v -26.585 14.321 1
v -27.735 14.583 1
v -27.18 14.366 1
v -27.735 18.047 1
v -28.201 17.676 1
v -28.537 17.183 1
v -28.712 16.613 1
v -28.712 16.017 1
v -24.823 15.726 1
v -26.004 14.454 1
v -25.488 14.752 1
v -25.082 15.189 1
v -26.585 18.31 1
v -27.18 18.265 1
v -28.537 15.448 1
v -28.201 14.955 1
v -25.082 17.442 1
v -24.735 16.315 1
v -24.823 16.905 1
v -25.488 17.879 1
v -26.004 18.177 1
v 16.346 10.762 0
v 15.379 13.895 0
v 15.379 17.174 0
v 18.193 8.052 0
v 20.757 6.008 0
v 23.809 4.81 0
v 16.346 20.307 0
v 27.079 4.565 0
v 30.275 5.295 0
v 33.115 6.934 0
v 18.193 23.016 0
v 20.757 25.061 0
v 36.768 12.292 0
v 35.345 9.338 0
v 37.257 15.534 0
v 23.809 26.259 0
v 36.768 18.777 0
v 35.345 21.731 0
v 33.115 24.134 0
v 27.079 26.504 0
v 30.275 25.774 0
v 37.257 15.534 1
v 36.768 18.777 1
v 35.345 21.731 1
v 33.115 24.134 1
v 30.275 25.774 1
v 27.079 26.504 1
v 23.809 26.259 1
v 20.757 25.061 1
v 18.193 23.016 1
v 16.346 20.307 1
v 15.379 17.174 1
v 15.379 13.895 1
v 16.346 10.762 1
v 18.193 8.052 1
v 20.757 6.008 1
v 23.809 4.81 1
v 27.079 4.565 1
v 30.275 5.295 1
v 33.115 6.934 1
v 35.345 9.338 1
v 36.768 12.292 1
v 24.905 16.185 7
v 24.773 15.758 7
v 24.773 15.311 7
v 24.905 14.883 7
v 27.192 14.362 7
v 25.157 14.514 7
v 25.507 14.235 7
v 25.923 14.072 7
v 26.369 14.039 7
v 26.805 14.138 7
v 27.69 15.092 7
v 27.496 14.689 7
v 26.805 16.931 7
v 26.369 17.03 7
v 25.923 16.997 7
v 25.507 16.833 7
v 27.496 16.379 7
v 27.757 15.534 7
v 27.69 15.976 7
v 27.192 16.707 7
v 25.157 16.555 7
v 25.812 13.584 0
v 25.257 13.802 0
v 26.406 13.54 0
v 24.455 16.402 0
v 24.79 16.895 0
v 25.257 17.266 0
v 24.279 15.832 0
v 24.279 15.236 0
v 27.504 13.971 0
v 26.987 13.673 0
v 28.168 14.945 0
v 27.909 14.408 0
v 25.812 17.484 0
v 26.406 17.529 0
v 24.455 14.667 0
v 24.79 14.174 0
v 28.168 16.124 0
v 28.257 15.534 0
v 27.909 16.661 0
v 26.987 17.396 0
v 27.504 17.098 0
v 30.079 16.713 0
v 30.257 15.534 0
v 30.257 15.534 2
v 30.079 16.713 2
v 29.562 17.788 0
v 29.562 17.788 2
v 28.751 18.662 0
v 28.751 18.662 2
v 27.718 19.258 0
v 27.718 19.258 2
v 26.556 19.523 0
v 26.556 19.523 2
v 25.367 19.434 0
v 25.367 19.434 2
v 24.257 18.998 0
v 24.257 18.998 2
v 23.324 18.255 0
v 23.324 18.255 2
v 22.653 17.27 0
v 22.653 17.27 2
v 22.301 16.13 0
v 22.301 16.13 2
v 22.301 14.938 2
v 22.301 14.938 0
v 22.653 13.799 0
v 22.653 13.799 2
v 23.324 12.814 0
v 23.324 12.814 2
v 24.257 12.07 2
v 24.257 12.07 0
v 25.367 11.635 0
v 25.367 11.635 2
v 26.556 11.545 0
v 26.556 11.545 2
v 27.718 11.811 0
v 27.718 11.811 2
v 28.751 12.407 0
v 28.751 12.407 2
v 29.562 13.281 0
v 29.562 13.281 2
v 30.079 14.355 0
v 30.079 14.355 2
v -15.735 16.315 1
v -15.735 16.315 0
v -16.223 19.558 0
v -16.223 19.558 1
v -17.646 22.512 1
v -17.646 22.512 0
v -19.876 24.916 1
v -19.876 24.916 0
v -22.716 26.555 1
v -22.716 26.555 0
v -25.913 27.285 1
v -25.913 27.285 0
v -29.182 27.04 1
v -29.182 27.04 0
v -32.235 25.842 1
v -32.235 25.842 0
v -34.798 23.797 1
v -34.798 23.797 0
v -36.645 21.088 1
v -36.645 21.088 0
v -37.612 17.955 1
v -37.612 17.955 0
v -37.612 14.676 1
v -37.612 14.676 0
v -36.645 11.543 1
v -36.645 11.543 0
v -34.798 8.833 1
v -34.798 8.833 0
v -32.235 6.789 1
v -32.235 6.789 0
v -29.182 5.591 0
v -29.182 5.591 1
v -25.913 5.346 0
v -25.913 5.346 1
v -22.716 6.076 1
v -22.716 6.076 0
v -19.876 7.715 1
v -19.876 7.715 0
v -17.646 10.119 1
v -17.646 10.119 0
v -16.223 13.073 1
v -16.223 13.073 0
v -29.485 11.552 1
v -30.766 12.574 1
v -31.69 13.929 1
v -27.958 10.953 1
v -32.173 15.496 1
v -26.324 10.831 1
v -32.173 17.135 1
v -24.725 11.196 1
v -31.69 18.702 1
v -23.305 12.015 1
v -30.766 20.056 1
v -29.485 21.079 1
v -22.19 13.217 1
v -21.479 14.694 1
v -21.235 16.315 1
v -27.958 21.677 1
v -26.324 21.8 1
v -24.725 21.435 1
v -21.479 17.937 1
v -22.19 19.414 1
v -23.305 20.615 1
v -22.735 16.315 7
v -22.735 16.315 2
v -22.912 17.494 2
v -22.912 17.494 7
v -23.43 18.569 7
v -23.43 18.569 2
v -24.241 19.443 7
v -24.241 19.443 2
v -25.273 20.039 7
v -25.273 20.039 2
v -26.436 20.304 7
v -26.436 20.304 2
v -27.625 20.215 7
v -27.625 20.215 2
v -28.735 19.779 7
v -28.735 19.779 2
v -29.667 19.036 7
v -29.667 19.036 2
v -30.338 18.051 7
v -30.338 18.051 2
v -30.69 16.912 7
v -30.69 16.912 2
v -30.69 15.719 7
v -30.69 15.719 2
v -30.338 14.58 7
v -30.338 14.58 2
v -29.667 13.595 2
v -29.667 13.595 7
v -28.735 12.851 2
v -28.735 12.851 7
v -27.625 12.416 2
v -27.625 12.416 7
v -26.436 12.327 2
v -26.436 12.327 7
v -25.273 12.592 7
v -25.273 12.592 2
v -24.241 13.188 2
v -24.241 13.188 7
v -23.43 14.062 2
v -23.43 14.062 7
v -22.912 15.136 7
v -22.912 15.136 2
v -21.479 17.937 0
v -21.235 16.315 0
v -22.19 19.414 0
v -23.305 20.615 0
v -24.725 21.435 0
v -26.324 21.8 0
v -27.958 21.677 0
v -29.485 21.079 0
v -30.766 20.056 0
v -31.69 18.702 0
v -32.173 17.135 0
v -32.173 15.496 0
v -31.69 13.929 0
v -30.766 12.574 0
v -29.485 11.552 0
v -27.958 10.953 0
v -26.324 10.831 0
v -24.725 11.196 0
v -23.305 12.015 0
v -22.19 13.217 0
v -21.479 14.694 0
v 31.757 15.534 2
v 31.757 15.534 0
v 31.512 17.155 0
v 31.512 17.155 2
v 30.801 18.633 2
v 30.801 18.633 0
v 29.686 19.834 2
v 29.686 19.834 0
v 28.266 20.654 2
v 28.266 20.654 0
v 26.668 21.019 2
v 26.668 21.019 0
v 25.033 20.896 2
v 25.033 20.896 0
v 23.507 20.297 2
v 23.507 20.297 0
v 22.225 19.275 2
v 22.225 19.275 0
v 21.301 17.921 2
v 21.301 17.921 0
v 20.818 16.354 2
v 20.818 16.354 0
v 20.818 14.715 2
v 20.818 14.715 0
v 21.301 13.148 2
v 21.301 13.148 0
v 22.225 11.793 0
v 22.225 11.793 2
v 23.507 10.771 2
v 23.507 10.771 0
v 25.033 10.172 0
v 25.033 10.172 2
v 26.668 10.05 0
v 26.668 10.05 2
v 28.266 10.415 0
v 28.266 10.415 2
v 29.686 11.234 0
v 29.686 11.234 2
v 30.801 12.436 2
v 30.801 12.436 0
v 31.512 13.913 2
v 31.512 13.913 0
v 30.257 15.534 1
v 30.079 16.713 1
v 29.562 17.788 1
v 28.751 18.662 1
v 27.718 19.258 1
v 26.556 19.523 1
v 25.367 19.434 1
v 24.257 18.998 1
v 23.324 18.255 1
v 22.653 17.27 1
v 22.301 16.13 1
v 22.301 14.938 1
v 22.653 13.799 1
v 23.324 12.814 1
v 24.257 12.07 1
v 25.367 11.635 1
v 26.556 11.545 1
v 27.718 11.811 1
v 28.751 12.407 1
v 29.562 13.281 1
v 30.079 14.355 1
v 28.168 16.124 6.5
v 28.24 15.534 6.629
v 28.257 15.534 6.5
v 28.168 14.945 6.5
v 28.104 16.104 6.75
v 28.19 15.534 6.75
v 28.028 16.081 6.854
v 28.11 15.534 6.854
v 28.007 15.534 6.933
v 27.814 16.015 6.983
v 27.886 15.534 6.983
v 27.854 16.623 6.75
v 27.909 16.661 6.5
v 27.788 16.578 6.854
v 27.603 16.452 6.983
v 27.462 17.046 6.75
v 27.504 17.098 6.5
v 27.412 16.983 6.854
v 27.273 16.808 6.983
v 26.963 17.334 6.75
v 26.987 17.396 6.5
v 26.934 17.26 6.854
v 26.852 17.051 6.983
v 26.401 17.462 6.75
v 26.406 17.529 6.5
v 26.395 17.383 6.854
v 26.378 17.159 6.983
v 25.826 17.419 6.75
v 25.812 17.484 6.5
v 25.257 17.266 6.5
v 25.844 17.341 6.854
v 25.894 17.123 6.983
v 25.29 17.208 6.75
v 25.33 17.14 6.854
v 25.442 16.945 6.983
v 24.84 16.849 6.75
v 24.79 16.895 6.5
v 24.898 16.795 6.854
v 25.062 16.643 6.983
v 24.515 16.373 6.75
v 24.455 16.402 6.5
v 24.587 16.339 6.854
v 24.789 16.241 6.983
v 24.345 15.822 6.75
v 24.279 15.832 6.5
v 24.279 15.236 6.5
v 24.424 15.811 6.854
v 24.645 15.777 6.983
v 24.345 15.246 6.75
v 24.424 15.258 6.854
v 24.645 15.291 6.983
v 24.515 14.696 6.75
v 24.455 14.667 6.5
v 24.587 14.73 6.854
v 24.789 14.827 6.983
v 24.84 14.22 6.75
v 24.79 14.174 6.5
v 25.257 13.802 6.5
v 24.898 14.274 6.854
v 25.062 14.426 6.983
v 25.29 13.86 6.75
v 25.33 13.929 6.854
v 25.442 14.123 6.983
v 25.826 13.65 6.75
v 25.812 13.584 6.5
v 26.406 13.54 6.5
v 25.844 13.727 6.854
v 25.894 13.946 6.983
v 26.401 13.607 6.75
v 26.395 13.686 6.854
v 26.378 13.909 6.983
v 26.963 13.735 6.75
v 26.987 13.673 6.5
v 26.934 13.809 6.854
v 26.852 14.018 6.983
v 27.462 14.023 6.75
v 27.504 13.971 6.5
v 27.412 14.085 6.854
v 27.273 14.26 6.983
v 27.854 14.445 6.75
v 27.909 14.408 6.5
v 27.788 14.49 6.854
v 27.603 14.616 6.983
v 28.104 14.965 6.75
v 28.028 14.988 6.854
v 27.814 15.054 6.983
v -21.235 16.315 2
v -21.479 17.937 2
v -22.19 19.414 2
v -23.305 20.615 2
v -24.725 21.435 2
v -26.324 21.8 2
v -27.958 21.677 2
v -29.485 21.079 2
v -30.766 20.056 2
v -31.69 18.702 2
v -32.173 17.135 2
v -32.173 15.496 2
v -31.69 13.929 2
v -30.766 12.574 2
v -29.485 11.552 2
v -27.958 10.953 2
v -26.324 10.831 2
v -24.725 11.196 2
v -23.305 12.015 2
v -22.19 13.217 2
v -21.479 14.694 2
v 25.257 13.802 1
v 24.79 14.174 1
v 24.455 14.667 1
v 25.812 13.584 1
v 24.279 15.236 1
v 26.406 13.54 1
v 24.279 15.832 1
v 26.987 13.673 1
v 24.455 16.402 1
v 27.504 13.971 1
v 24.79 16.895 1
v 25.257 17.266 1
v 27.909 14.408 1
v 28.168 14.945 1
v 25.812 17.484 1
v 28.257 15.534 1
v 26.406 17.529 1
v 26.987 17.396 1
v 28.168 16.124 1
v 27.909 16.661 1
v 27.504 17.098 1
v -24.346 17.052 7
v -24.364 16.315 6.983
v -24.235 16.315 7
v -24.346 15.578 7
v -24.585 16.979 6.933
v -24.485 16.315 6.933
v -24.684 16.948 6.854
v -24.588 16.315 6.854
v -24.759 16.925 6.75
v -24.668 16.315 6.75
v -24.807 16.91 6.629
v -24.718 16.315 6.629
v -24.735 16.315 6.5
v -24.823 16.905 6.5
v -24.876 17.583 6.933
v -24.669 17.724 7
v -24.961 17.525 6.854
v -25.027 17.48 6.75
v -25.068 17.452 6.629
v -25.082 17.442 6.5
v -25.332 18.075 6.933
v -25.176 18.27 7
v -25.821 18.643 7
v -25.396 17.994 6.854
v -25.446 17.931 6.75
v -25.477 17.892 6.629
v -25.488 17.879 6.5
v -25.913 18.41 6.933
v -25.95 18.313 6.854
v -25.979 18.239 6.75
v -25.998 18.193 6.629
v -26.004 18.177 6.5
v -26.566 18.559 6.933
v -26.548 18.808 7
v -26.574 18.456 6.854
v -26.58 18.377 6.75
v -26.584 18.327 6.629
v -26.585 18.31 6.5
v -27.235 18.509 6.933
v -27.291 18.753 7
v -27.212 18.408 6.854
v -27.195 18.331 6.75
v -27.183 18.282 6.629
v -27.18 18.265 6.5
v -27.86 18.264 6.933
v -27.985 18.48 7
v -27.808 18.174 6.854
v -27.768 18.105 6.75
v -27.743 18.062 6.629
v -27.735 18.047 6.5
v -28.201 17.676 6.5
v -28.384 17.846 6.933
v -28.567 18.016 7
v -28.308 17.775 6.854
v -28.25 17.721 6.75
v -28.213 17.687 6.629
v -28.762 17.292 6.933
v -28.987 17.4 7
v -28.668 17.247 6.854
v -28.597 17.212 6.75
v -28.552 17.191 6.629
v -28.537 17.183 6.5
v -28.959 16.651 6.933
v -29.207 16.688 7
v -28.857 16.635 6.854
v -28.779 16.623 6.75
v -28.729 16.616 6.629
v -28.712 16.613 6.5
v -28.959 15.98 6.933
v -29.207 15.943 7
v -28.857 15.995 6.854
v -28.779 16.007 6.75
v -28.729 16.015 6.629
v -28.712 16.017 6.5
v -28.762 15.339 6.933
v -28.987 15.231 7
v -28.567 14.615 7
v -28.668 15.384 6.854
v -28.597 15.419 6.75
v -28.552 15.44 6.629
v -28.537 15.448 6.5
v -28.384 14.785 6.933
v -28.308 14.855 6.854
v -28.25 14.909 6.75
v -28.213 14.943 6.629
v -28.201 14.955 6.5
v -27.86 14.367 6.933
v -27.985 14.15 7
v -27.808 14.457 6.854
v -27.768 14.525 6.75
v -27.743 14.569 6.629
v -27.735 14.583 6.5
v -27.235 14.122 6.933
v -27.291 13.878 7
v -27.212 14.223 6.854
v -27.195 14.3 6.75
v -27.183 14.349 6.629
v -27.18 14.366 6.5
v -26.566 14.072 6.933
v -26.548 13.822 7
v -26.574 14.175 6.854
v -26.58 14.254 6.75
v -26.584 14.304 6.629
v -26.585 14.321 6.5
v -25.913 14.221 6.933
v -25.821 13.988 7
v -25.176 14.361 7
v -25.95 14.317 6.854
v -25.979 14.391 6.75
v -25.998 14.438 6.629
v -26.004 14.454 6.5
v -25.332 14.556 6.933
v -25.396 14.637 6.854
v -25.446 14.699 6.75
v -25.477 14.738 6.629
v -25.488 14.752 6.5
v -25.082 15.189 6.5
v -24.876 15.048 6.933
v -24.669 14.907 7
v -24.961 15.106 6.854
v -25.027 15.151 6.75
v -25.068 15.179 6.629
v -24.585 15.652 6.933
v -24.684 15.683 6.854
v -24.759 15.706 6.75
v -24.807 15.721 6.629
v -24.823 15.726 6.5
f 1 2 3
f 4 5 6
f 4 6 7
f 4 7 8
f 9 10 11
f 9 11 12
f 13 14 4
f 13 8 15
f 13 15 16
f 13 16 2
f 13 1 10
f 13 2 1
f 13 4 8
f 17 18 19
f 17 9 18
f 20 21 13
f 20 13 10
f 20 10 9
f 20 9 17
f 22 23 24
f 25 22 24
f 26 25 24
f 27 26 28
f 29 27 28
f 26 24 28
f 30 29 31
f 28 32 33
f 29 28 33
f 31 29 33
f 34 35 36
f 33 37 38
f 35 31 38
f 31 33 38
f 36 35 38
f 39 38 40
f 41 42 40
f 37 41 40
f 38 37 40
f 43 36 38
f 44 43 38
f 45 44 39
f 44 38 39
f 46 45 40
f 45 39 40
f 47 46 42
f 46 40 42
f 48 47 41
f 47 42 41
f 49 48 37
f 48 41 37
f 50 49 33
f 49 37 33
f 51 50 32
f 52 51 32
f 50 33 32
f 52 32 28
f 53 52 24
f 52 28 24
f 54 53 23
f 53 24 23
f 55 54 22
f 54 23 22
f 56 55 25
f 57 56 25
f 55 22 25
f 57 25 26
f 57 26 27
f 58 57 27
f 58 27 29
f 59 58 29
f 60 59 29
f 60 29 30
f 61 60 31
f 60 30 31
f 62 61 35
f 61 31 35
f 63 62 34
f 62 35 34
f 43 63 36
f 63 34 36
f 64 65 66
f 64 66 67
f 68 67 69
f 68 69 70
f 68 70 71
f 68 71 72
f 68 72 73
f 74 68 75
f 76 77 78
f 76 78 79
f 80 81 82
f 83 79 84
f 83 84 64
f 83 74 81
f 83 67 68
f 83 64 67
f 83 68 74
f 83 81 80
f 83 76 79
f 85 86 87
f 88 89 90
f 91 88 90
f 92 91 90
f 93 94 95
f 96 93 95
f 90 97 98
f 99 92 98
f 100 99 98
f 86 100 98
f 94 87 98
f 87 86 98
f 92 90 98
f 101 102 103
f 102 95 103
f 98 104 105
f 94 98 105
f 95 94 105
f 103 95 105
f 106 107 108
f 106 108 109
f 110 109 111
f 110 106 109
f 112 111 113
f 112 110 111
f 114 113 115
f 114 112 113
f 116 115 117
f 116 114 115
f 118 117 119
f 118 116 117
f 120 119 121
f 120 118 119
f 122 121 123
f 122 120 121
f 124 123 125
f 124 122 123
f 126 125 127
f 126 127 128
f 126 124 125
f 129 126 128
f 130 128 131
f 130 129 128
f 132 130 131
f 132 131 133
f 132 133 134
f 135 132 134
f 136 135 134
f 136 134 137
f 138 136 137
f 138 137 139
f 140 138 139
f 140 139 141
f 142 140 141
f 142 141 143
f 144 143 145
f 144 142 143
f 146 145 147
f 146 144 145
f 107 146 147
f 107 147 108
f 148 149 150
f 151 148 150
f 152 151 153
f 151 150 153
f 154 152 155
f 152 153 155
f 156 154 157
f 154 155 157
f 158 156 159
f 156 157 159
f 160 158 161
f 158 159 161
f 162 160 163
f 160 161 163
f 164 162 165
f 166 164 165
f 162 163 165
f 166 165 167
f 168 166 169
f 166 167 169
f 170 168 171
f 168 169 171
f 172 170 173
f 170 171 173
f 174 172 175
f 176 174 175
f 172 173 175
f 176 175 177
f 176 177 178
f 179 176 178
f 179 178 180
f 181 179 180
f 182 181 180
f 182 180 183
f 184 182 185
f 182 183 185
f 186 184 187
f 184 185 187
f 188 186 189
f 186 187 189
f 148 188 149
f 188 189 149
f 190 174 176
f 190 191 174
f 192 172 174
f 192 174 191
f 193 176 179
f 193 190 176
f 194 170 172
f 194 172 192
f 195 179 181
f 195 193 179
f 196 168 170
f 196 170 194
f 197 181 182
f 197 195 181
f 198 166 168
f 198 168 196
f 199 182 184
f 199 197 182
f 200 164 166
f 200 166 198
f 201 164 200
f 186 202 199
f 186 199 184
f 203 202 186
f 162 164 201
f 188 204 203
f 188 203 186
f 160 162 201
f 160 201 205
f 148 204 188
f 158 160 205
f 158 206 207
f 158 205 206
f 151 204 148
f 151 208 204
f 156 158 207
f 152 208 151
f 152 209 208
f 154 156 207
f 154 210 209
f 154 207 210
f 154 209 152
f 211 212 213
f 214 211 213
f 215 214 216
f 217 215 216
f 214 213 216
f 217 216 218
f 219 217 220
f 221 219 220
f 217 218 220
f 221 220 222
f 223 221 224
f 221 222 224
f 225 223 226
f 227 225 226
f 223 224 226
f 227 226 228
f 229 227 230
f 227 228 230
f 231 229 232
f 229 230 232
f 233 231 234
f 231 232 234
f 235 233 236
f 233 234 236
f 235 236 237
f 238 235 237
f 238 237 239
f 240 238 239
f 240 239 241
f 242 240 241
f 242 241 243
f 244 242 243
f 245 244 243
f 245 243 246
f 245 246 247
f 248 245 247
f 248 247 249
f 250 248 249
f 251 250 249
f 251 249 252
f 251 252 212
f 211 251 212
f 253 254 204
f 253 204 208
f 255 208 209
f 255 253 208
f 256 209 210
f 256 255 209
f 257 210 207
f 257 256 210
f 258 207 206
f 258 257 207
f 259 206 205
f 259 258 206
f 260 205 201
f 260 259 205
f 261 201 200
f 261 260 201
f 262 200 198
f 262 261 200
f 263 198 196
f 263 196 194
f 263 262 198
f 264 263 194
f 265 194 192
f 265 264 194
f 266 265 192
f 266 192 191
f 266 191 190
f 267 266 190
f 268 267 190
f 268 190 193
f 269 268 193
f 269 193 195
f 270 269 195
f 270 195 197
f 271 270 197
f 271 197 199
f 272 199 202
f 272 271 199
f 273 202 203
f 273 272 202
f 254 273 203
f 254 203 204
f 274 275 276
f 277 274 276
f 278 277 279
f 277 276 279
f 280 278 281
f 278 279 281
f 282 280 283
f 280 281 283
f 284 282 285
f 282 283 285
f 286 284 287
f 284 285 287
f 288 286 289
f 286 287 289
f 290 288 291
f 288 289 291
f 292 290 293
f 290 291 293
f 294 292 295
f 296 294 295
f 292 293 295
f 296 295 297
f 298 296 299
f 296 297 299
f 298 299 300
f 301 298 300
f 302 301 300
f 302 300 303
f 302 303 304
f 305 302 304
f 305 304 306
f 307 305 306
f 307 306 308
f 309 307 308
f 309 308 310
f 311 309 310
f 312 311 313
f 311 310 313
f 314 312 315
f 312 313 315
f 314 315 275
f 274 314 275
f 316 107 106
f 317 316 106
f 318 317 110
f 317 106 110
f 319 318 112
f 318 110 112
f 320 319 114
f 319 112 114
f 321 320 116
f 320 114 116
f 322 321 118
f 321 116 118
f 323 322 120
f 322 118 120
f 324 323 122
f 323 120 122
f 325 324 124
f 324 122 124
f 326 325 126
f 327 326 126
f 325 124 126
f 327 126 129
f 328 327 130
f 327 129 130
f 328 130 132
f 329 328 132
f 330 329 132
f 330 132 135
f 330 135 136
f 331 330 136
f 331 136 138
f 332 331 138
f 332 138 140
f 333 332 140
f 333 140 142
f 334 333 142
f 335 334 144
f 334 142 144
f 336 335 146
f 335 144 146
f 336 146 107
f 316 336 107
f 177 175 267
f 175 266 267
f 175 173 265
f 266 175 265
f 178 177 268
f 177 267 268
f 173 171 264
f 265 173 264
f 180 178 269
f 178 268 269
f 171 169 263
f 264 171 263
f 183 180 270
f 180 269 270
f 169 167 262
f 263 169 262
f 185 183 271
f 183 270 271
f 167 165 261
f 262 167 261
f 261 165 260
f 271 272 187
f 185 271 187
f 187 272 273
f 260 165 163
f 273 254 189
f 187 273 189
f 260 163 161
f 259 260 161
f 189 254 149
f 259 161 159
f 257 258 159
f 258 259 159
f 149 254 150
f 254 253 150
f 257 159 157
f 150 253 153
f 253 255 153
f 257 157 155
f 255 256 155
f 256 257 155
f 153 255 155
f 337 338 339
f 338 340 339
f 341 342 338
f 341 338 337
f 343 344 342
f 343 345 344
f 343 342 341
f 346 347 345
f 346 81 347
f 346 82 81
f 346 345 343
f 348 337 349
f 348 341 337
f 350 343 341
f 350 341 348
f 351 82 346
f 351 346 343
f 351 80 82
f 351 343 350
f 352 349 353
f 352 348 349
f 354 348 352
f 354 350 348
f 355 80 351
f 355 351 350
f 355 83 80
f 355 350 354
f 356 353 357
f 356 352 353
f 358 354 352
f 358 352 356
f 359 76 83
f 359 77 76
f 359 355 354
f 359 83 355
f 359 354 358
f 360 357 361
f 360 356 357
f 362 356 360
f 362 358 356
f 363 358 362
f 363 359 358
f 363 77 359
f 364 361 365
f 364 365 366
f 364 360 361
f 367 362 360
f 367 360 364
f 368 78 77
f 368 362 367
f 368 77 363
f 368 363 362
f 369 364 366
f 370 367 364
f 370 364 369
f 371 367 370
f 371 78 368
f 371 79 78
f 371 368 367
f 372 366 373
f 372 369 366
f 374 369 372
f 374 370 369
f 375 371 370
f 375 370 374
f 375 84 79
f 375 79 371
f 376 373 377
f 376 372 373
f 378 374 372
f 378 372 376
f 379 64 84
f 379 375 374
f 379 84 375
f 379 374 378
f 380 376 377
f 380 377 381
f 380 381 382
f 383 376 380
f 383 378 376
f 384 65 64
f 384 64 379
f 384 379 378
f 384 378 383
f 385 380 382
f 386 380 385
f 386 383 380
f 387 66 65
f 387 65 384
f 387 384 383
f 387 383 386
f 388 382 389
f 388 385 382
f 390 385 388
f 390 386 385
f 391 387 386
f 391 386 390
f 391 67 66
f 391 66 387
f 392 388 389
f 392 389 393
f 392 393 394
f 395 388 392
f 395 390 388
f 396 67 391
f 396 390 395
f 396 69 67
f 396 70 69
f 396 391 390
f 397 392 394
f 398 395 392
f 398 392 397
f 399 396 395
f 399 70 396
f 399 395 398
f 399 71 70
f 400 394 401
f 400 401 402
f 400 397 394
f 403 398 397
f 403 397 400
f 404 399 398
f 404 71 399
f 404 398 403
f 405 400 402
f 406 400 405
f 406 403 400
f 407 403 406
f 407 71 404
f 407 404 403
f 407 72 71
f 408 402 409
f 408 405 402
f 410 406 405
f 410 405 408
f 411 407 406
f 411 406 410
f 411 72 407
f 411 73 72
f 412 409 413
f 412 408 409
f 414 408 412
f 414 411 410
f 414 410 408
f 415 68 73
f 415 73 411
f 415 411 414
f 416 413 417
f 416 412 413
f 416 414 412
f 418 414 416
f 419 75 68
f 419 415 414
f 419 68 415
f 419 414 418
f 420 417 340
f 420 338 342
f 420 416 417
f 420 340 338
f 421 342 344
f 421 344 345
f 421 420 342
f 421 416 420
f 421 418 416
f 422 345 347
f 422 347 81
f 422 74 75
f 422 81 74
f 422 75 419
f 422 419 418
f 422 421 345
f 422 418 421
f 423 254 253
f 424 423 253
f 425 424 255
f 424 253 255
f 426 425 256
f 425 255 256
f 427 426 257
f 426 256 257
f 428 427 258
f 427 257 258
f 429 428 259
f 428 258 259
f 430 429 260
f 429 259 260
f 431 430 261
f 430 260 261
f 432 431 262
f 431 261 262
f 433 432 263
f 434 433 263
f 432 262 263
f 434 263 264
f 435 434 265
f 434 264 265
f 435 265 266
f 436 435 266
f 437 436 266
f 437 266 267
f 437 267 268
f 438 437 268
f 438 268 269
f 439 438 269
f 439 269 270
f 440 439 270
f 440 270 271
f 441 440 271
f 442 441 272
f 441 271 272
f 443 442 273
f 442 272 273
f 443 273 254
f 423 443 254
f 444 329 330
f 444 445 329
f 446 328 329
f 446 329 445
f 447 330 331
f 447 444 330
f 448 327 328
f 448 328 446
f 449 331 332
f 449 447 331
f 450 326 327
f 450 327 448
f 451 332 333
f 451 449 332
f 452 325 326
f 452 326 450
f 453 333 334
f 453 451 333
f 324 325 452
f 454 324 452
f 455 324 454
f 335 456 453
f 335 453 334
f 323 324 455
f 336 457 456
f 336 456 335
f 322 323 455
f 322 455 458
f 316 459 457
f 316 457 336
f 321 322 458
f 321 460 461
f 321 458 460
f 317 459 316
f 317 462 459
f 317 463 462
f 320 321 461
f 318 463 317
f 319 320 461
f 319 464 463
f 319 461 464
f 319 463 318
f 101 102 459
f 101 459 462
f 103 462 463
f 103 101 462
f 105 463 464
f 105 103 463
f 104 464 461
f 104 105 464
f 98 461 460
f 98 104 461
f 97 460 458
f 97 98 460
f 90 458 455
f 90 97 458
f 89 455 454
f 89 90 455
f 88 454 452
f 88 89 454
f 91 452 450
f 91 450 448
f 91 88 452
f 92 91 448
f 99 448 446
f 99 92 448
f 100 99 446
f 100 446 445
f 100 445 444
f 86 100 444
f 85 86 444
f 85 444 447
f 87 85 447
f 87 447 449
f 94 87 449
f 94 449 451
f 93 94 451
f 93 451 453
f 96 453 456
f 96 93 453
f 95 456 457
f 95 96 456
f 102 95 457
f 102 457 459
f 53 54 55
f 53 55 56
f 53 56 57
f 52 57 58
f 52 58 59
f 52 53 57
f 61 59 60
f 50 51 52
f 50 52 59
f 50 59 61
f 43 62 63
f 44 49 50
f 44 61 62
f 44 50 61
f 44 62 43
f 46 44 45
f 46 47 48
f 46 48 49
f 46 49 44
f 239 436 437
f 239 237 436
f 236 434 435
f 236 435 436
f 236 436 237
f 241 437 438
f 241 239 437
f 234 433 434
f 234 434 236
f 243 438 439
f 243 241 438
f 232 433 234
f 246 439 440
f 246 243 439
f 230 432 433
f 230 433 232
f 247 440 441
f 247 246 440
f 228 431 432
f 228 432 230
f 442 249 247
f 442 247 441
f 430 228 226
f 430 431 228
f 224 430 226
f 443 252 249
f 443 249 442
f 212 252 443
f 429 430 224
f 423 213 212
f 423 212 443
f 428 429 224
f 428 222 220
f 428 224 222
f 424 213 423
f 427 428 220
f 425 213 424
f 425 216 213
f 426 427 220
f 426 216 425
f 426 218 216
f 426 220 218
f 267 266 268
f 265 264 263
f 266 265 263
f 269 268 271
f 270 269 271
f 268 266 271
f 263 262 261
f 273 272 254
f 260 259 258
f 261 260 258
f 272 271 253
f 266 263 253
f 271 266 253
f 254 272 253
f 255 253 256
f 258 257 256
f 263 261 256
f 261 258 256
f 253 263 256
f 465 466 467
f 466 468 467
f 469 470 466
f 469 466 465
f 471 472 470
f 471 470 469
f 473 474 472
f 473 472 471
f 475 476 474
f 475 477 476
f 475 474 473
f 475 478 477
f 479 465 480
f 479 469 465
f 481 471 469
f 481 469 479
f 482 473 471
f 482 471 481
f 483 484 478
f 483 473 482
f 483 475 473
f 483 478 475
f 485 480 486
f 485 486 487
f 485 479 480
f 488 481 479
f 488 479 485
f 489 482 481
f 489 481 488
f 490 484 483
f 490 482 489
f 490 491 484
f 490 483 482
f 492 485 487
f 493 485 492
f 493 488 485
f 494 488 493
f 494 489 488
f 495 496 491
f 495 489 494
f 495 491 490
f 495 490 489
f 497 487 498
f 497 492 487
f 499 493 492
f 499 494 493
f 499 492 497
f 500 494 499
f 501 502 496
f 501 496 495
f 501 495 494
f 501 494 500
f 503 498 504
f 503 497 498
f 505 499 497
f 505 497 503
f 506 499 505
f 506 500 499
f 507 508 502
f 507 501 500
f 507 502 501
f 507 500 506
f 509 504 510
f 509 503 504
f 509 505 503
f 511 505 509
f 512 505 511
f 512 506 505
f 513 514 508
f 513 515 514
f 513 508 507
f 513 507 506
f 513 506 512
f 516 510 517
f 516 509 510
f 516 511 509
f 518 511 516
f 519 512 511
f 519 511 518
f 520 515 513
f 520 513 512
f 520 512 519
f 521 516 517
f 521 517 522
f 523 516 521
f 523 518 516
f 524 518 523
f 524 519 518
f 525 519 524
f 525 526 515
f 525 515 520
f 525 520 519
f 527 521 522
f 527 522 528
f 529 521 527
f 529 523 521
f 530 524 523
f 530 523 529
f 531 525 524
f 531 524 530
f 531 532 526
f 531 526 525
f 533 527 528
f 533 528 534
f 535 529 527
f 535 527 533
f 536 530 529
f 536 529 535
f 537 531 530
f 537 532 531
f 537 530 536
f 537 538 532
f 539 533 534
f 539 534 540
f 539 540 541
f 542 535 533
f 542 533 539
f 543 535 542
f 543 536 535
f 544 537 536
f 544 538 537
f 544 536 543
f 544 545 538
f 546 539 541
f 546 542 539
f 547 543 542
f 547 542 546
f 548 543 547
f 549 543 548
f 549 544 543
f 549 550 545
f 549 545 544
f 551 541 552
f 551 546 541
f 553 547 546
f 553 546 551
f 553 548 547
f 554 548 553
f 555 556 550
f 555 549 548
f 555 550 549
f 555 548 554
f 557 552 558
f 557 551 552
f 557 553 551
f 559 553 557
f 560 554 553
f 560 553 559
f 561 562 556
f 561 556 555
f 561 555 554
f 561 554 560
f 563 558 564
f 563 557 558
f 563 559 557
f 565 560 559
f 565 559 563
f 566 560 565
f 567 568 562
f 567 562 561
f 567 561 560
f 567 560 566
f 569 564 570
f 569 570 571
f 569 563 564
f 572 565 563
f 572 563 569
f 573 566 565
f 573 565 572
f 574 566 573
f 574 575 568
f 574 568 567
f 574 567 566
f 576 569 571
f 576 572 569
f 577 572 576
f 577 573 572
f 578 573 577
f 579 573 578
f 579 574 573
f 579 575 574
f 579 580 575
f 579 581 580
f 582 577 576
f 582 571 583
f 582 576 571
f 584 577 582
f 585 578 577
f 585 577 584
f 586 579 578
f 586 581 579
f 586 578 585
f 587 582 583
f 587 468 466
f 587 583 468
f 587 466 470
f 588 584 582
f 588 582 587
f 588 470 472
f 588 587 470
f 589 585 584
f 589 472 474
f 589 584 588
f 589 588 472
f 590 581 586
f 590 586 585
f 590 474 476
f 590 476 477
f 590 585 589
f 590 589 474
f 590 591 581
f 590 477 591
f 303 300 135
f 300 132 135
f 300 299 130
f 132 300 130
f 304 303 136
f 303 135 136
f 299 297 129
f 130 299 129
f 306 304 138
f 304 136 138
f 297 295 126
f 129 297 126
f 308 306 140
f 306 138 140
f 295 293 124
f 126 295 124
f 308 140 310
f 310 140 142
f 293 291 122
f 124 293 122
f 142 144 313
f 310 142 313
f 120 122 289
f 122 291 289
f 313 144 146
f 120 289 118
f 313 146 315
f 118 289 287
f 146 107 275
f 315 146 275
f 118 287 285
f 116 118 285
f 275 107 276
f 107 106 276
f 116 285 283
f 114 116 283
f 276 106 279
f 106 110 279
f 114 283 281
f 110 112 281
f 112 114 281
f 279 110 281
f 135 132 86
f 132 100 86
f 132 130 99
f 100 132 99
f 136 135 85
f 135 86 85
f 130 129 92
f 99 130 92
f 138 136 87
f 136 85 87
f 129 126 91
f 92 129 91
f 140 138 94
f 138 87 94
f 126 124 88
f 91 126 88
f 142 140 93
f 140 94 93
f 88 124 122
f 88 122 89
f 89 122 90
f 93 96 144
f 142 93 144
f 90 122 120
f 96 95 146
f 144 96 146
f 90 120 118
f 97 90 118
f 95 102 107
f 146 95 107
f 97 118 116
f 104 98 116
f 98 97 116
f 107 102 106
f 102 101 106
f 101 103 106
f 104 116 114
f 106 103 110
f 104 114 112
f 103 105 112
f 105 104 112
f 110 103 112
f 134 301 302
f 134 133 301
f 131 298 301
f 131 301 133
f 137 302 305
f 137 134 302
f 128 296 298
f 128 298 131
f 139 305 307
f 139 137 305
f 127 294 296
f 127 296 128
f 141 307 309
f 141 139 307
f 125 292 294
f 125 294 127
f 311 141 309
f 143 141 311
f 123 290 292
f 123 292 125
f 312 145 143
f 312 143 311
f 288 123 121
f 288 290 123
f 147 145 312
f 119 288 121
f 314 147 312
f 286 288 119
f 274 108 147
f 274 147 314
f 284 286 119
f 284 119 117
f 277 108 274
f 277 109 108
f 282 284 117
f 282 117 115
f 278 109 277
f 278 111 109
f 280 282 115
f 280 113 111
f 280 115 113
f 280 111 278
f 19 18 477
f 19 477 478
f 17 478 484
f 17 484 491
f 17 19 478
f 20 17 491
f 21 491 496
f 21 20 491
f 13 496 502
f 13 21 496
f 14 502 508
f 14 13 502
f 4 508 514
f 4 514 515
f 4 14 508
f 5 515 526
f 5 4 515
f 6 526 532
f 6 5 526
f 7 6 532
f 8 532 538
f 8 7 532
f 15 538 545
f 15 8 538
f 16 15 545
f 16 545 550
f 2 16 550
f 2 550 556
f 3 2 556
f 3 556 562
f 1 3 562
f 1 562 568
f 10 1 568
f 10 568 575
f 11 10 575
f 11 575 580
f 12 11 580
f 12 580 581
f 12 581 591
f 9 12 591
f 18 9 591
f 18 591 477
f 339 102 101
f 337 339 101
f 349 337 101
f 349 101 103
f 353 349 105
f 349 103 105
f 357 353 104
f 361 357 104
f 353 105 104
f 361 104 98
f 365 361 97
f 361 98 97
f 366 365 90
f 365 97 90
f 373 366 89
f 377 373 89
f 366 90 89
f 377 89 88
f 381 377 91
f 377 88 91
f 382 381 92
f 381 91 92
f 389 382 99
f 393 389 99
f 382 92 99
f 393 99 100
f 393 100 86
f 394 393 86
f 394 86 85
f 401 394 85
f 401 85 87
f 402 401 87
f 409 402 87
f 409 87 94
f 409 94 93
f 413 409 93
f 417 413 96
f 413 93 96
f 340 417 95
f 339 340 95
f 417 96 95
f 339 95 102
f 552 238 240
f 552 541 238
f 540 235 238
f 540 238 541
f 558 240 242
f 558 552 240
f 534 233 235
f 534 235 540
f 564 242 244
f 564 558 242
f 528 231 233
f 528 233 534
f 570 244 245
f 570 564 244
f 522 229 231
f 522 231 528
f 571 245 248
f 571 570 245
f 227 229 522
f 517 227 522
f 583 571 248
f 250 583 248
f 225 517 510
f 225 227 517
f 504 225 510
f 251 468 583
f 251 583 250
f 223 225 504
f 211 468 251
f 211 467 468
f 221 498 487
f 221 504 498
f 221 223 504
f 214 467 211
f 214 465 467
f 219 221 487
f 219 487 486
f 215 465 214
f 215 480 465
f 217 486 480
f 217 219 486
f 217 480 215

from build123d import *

# Parameters (mm, degrees)
F0_R     = 11
F0_R_2   = 5.5
F2_DEPTH = 1
F1_R     = 11
F1_R_2   = 5.5
F1_R_3   = 4
F1_R_4   = 2
F0_R_3   = 4
F3_DEPTH = 2
F0_R_4   = 2
F4_DEPTH = 7
F5_DEPTH = 1
F6_DEPTH = 1
F7_R     = 0.5
F7_2_R   = 0.5


with BuildPart() as f2:
    # F0 (on Top) → F2 (new body)
    with BuildSketch(Plane.XY):
        with Locations((-26.7346166074, 16.3153856993)):
            Circle(F0_R)
        with Locations((-26.7346166074, 16.3153856993)):
            Circle(F0_R_2, mode=Mode.SUBTRACT)
    extrude(amount=F2_DEPTH)


with BuildPart() as f2b:
    # F1 (on face) → F2, piece 2 (new body)
    with BuildSketch(Plane.XY):
        with Locations((26.2566003948, 15.5343096703)):
            Circle(F1_R)
        with Locations((26.2566003948, 15.5343096703)):
            Circle(F1_R_2, mode=Mode.SUBTRACT)
        with Locations((26.2566003948, 15.5343096703)):
            Circle(F1_R_2)
        with Locations((26.2566003948, 15.5343096703)):
            Circle(F1_R_3, mode=Mode.SUBTRACT)
        with Locations((26.2566003948, 15.5343096703)):
            Circle(F1_R_3)
        with Locations((26.2566003948, 15.5343096703)):
            Circle(F1_R_4, mode=Mode.SUBTRACT)
        with Locations((26.2566003948, 15.5343096703)):
            Circle(F1_R_4)
    extrude(amount=F2_DEPTH)


with BuildPart() as f3:
    # F0 (on Top) → F3 (new body)
    with BuildSketch(Plane.XY):
        with Locations((-26.7346166074, 16.3153856993)):
            Circle(F0_R_2)
        with Locations((-26.7346166074, 16.3153856993)):
            Circle(F0_R_3, mode=Mode.SUBTRACT)
    extrude(amount=F3_DEPTH)

    # F0 (on Top) → F4 (join)
    with BuildSketch(Plane.XY):
        with Locations((-26.7346166074, 16.3153856993)):
            Circle(F0_R_3)
        with Locations((-26.7346166074, 16.3153856993)):
            Circle(F0_R_4, mode=Mode.SUBTRACT)
    extrude(amount=F4_DEPTH)

    # F0 (on Top) → F6 (join)
    with BuildSketch(Plane.XY):
        with Locations((-26.7346166074, 16.3153856993)):
            Circle(F0_R_4)
    extrude(amount=F6_DEPTH)

    # F7
    f7_edges = [f3.edges().sort_by_distance(p)[0] for p in [
        (-28.734617, 16.315386, 7),
    ]]
    fillet(f7_edges, radius=F7_R)


with BuildPart() as f3b:
    # F1 (on face) → F3, piece 2 (new body)
    with BuildSketch(Plane.XY):
        with Locations((26.2566003948, 15.5343096703)):
            Circle(F1_R_2)
        with Locations((26.2566003948, 15.5343096703)):
            Circle(F1_R_3, mode=Mode.SUBTRACT)
    extrude(amount=F3_DEPTH)


with BuildPart() as f4:
    # F1 (on face) → F4, piece 2 (new body)
    with BuildSketch(Plane.XY):
        with Locations((26.2566003948, 15.5343096703)):
            Circle(F1_R_4)
    extrude(amount=F4_DEPTH)

    # F7#2
    f7_2_edges = [f4.edges().sort_by_distance(p)[0] for p in [
        (24.2566, 15.53431, 7),
    ]]
    fillet(f7_2_edges, radius=F7_2_R)


with BuildPart() as f5:
    # F1 (on face) → F5 (new body)
    with BuildSketch(Plane.XY):
        with Locations((26.2566003948, 15.5343096703)):
            Circle(F1_R_3)
        with Locations((26.2566003948, 15.5343096703)):
            Circle(F1_R_4, mode=Mode.SUBTRACT)
    extrude(amount=F5_DEPTH)


solid = Compound([f2.part, f2b.part, f3.part, f3b.part, f4.part, f5.part])
